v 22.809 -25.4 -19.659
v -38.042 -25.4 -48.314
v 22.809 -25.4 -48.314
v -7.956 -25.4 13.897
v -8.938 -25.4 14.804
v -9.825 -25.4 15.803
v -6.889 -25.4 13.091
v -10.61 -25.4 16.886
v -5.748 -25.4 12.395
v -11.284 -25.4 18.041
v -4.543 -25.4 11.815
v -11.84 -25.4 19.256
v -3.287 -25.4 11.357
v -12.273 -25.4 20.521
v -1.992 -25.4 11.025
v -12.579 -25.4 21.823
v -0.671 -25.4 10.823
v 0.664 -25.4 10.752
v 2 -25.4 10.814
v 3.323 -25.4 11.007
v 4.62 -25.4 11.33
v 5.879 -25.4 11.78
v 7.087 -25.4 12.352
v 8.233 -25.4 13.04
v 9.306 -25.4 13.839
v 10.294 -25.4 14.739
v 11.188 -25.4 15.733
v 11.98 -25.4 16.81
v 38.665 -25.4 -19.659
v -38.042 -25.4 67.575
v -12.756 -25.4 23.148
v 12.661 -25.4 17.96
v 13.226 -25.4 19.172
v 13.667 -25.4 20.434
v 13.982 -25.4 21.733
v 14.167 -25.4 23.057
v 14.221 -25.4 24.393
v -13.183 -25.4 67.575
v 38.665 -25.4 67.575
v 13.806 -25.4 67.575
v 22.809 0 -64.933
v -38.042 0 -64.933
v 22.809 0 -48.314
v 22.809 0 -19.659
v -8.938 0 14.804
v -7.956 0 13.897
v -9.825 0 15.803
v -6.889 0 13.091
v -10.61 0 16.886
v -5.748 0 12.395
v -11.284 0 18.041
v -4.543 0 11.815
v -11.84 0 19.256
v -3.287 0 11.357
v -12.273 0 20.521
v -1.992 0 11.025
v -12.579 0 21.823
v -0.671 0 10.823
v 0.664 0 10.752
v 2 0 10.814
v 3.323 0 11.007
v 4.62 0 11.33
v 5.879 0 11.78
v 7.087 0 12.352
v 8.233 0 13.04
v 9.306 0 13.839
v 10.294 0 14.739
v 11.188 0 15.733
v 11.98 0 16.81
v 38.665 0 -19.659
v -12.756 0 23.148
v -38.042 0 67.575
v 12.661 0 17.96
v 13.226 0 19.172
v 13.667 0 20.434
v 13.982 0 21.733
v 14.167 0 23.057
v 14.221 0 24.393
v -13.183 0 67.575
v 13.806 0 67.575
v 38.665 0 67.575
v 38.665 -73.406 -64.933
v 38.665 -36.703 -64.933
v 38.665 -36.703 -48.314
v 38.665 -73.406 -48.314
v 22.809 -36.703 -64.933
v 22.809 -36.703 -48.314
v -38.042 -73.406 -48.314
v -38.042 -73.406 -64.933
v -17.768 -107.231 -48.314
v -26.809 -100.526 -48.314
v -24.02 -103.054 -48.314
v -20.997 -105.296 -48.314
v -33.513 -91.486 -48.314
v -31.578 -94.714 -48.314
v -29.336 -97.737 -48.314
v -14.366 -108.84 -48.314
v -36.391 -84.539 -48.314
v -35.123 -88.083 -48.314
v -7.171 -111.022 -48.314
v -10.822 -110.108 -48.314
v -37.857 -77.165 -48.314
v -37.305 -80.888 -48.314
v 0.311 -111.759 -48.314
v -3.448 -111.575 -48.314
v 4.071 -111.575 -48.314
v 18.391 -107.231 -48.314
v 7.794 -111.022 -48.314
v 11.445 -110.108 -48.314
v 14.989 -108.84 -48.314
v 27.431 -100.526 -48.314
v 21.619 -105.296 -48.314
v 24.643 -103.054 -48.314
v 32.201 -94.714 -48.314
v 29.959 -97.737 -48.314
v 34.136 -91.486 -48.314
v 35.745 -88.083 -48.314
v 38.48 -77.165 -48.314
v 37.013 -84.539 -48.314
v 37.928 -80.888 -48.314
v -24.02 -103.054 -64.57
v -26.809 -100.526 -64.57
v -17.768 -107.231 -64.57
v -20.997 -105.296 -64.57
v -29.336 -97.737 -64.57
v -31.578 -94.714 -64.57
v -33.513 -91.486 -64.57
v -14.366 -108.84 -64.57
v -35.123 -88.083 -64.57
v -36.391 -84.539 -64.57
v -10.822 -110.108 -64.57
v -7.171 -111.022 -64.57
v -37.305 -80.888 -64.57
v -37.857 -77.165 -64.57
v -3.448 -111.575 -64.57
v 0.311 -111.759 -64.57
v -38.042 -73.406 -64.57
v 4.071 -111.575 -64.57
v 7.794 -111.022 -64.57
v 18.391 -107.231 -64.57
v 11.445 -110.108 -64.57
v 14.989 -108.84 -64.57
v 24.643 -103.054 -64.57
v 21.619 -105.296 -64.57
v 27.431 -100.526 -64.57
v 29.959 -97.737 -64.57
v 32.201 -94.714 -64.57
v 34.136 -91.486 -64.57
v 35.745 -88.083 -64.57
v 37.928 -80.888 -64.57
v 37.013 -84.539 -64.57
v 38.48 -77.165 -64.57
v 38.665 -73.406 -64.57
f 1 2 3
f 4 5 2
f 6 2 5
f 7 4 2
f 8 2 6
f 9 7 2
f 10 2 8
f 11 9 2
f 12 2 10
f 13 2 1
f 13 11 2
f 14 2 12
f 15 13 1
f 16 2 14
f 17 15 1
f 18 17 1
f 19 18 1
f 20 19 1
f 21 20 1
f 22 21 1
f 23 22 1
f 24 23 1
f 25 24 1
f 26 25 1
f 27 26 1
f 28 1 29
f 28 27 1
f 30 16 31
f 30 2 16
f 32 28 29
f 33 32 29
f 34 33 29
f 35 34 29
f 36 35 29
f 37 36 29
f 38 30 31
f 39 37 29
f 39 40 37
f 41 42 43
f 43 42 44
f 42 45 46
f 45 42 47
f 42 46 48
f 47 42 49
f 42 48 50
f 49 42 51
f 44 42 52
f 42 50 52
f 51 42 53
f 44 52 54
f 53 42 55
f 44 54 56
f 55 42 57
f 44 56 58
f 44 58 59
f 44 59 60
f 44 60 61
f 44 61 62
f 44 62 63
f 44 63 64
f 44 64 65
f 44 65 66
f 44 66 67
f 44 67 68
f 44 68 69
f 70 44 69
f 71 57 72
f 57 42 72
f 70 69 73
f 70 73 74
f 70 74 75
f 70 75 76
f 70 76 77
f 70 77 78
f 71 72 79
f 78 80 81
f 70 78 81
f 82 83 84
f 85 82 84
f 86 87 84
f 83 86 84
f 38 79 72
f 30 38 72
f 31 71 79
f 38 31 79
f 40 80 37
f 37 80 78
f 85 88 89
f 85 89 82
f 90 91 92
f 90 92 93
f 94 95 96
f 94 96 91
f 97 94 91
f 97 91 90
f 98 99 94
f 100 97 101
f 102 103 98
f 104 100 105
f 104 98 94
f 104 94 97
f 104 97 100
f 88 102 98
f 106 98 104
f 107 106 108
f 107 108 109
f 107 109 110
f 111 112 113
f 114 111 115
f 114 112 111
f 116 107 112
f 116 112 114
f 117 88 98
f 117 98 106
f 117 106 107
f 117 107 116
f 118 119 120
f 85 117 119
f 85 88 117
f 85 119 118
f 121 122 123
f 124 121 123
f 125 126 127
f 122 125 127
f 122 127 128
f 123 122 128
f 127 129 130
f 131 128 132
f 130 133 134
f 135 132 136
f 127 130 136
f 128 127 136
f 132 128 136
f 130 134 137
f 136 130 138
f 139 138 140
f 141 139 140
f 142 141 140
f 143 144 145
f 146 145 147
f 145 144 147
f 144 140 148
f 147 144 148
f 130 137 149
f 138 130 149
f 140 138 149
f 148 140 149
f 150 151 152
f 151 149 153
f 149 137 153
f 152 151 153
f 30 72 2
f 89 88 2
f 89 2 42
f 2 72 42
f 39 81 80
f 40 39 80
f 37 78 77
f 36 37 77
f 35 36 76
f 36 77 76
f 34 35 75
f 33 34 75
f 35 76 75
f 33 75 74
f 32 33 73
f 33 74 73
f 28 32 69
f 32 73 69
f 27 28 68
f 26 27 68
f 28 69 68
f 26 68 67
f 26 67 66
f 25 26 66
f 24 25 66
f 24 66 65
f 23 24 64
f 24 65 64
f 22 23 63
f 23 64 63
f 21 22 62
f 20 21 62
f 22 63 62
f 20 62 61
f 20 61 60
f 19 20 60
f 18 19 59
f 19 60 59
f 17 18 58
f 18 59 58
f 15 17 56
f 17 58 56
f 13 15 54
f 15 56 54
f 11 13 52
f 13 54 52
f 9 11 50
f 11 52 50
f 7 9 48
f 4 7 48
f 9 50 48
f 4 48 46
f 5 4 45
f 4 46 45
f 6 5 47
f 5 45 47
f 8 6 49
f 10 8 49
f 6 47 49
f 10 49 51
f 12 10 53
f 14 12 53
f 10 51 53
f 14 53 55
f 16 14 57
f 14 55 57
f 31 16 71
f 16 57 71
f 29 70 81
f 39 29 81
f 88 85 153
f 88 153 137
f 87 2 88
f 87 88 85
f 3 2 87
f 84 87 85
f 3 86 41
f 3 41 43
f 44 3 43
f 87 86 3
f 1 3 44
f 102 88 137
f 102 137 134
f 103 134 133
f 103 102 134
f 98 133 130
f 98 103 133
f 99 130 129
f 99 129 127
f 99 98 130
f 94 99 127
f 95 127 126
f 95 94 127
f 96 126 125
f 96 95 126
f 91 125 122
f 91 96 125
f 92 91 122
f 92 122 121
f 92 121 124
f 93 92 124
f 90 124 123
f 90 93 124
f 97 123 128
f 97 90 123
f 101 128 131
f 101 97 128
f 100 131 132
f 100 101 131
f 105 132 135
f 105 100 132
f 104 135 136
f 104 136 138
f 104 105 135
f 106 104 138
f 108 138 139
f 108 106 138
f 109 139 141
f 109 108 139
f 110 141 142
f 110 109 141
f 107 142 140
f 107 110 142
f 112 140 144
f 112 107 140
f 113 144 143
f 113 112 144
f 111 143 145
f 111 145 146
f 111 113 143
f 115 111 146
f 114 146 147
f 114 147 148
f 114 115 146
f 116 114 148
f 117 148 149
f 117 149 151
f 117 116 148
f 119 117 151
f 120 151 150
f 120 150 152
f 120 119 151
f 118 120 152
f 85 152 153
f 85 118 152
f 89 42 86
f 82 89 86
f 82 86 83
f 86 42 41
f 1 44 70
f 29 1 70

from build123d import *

# Parameters (mm, degrees)
F0_W     = 76.706789434
F0_H     = 16.6184976697
F1_DEPTH = 25.4
F2_DEPTH = 73.406
F4_DEPTH = 16.256
F5_W     = 15.856044367
F5_H     = 28.6552160978
F6_DEPTH = 177.8
F8_DEPTH = 177.8


with BuildPart() as f1:
    # F0 (on Front) → F1 (new body)
    with BuildSketch(Plane.XZ):
        with BuildLine():
            Line((-13.1827415898, 67.5745382905), (-38.0419902503, 67.5745382905))
            Line((-38.0419902503, 67.5745382905), (-38.0419902503, -48.3142435551))
            Line((-38.0419902503, -48.3142435551), (38.6647991836, -48.3142435551))
            Line((38.6647991836, -48.3142435551), (38.6647991836, 67.5745382905))
            Line((38.6647991836, 67.5745382905), (13.8055505231, 67.5745382905))
            Line((13.8055505231, 67.5745382905), (14.2207480967, 24.3932679296))
            ThreePointArc((14.2207480967, 24.3932679296), (1.3330005571, 10.7661984691), (-12.7555682648, 23.1477689379))
            Line((-12.7555682648, 23.1477689379), (-13.1827415898, 67.5745382905))
        make_face()
        with Locations((0.3114044666, -56.6234923899)):
            Rectangle(F0_W, F0_H)
    extrude(amount=F1_DEPTH)

    # F0 (on Front) → F2 (join)
    with BuildSketch(Plane.XZ):
        with Locations((0.3114044666, -56.6234923899)):
            Rectangle(F0_W, F0_H)
    extrude(amount=F2_DEPTH)

    # F5 (on face) → F6 (cut)
    with BuildSketch(Plane.XZ.offset(25.4)):
        with Locations((30.7367770001, -33.9866355062)):
            Rectangle(F5_W, F5_H)
    extrude(amount=-F6_DEPTH, mode=Mode.SUBTRACT)

    # F7 (on face) → F8 (cut)
    with BuildSketch(Plane.XY.offset(-48.3142435551)):
        Polygon((22.8087548167, 0), (22.8087548167, -25.4), (22.8087548167, -36.703), (38.6647991836, -36.703), (38.6647991836, 0), align=None)
    extrude(amount=-F8_DEPTH, mode=Mode.SUBTRACT)


with BuildPart() as f4:
    # F3 (on face) → F4 (new body)
    with BuildSketch(Plane.XY.offset(-48.3142435551)):
        with BuildLine():
            Line((38.6647991836, -73.406), (-38.0419902503, -73.406))
            ThreePointArc((-38.0419902503, -73.406), (0.3114044666, -111.759394717), (38.6647991836, -73.406))
        make_face()
    extrude(amount=-F4_DEPTH)


solid = Compound([f1.part, f4.part])
